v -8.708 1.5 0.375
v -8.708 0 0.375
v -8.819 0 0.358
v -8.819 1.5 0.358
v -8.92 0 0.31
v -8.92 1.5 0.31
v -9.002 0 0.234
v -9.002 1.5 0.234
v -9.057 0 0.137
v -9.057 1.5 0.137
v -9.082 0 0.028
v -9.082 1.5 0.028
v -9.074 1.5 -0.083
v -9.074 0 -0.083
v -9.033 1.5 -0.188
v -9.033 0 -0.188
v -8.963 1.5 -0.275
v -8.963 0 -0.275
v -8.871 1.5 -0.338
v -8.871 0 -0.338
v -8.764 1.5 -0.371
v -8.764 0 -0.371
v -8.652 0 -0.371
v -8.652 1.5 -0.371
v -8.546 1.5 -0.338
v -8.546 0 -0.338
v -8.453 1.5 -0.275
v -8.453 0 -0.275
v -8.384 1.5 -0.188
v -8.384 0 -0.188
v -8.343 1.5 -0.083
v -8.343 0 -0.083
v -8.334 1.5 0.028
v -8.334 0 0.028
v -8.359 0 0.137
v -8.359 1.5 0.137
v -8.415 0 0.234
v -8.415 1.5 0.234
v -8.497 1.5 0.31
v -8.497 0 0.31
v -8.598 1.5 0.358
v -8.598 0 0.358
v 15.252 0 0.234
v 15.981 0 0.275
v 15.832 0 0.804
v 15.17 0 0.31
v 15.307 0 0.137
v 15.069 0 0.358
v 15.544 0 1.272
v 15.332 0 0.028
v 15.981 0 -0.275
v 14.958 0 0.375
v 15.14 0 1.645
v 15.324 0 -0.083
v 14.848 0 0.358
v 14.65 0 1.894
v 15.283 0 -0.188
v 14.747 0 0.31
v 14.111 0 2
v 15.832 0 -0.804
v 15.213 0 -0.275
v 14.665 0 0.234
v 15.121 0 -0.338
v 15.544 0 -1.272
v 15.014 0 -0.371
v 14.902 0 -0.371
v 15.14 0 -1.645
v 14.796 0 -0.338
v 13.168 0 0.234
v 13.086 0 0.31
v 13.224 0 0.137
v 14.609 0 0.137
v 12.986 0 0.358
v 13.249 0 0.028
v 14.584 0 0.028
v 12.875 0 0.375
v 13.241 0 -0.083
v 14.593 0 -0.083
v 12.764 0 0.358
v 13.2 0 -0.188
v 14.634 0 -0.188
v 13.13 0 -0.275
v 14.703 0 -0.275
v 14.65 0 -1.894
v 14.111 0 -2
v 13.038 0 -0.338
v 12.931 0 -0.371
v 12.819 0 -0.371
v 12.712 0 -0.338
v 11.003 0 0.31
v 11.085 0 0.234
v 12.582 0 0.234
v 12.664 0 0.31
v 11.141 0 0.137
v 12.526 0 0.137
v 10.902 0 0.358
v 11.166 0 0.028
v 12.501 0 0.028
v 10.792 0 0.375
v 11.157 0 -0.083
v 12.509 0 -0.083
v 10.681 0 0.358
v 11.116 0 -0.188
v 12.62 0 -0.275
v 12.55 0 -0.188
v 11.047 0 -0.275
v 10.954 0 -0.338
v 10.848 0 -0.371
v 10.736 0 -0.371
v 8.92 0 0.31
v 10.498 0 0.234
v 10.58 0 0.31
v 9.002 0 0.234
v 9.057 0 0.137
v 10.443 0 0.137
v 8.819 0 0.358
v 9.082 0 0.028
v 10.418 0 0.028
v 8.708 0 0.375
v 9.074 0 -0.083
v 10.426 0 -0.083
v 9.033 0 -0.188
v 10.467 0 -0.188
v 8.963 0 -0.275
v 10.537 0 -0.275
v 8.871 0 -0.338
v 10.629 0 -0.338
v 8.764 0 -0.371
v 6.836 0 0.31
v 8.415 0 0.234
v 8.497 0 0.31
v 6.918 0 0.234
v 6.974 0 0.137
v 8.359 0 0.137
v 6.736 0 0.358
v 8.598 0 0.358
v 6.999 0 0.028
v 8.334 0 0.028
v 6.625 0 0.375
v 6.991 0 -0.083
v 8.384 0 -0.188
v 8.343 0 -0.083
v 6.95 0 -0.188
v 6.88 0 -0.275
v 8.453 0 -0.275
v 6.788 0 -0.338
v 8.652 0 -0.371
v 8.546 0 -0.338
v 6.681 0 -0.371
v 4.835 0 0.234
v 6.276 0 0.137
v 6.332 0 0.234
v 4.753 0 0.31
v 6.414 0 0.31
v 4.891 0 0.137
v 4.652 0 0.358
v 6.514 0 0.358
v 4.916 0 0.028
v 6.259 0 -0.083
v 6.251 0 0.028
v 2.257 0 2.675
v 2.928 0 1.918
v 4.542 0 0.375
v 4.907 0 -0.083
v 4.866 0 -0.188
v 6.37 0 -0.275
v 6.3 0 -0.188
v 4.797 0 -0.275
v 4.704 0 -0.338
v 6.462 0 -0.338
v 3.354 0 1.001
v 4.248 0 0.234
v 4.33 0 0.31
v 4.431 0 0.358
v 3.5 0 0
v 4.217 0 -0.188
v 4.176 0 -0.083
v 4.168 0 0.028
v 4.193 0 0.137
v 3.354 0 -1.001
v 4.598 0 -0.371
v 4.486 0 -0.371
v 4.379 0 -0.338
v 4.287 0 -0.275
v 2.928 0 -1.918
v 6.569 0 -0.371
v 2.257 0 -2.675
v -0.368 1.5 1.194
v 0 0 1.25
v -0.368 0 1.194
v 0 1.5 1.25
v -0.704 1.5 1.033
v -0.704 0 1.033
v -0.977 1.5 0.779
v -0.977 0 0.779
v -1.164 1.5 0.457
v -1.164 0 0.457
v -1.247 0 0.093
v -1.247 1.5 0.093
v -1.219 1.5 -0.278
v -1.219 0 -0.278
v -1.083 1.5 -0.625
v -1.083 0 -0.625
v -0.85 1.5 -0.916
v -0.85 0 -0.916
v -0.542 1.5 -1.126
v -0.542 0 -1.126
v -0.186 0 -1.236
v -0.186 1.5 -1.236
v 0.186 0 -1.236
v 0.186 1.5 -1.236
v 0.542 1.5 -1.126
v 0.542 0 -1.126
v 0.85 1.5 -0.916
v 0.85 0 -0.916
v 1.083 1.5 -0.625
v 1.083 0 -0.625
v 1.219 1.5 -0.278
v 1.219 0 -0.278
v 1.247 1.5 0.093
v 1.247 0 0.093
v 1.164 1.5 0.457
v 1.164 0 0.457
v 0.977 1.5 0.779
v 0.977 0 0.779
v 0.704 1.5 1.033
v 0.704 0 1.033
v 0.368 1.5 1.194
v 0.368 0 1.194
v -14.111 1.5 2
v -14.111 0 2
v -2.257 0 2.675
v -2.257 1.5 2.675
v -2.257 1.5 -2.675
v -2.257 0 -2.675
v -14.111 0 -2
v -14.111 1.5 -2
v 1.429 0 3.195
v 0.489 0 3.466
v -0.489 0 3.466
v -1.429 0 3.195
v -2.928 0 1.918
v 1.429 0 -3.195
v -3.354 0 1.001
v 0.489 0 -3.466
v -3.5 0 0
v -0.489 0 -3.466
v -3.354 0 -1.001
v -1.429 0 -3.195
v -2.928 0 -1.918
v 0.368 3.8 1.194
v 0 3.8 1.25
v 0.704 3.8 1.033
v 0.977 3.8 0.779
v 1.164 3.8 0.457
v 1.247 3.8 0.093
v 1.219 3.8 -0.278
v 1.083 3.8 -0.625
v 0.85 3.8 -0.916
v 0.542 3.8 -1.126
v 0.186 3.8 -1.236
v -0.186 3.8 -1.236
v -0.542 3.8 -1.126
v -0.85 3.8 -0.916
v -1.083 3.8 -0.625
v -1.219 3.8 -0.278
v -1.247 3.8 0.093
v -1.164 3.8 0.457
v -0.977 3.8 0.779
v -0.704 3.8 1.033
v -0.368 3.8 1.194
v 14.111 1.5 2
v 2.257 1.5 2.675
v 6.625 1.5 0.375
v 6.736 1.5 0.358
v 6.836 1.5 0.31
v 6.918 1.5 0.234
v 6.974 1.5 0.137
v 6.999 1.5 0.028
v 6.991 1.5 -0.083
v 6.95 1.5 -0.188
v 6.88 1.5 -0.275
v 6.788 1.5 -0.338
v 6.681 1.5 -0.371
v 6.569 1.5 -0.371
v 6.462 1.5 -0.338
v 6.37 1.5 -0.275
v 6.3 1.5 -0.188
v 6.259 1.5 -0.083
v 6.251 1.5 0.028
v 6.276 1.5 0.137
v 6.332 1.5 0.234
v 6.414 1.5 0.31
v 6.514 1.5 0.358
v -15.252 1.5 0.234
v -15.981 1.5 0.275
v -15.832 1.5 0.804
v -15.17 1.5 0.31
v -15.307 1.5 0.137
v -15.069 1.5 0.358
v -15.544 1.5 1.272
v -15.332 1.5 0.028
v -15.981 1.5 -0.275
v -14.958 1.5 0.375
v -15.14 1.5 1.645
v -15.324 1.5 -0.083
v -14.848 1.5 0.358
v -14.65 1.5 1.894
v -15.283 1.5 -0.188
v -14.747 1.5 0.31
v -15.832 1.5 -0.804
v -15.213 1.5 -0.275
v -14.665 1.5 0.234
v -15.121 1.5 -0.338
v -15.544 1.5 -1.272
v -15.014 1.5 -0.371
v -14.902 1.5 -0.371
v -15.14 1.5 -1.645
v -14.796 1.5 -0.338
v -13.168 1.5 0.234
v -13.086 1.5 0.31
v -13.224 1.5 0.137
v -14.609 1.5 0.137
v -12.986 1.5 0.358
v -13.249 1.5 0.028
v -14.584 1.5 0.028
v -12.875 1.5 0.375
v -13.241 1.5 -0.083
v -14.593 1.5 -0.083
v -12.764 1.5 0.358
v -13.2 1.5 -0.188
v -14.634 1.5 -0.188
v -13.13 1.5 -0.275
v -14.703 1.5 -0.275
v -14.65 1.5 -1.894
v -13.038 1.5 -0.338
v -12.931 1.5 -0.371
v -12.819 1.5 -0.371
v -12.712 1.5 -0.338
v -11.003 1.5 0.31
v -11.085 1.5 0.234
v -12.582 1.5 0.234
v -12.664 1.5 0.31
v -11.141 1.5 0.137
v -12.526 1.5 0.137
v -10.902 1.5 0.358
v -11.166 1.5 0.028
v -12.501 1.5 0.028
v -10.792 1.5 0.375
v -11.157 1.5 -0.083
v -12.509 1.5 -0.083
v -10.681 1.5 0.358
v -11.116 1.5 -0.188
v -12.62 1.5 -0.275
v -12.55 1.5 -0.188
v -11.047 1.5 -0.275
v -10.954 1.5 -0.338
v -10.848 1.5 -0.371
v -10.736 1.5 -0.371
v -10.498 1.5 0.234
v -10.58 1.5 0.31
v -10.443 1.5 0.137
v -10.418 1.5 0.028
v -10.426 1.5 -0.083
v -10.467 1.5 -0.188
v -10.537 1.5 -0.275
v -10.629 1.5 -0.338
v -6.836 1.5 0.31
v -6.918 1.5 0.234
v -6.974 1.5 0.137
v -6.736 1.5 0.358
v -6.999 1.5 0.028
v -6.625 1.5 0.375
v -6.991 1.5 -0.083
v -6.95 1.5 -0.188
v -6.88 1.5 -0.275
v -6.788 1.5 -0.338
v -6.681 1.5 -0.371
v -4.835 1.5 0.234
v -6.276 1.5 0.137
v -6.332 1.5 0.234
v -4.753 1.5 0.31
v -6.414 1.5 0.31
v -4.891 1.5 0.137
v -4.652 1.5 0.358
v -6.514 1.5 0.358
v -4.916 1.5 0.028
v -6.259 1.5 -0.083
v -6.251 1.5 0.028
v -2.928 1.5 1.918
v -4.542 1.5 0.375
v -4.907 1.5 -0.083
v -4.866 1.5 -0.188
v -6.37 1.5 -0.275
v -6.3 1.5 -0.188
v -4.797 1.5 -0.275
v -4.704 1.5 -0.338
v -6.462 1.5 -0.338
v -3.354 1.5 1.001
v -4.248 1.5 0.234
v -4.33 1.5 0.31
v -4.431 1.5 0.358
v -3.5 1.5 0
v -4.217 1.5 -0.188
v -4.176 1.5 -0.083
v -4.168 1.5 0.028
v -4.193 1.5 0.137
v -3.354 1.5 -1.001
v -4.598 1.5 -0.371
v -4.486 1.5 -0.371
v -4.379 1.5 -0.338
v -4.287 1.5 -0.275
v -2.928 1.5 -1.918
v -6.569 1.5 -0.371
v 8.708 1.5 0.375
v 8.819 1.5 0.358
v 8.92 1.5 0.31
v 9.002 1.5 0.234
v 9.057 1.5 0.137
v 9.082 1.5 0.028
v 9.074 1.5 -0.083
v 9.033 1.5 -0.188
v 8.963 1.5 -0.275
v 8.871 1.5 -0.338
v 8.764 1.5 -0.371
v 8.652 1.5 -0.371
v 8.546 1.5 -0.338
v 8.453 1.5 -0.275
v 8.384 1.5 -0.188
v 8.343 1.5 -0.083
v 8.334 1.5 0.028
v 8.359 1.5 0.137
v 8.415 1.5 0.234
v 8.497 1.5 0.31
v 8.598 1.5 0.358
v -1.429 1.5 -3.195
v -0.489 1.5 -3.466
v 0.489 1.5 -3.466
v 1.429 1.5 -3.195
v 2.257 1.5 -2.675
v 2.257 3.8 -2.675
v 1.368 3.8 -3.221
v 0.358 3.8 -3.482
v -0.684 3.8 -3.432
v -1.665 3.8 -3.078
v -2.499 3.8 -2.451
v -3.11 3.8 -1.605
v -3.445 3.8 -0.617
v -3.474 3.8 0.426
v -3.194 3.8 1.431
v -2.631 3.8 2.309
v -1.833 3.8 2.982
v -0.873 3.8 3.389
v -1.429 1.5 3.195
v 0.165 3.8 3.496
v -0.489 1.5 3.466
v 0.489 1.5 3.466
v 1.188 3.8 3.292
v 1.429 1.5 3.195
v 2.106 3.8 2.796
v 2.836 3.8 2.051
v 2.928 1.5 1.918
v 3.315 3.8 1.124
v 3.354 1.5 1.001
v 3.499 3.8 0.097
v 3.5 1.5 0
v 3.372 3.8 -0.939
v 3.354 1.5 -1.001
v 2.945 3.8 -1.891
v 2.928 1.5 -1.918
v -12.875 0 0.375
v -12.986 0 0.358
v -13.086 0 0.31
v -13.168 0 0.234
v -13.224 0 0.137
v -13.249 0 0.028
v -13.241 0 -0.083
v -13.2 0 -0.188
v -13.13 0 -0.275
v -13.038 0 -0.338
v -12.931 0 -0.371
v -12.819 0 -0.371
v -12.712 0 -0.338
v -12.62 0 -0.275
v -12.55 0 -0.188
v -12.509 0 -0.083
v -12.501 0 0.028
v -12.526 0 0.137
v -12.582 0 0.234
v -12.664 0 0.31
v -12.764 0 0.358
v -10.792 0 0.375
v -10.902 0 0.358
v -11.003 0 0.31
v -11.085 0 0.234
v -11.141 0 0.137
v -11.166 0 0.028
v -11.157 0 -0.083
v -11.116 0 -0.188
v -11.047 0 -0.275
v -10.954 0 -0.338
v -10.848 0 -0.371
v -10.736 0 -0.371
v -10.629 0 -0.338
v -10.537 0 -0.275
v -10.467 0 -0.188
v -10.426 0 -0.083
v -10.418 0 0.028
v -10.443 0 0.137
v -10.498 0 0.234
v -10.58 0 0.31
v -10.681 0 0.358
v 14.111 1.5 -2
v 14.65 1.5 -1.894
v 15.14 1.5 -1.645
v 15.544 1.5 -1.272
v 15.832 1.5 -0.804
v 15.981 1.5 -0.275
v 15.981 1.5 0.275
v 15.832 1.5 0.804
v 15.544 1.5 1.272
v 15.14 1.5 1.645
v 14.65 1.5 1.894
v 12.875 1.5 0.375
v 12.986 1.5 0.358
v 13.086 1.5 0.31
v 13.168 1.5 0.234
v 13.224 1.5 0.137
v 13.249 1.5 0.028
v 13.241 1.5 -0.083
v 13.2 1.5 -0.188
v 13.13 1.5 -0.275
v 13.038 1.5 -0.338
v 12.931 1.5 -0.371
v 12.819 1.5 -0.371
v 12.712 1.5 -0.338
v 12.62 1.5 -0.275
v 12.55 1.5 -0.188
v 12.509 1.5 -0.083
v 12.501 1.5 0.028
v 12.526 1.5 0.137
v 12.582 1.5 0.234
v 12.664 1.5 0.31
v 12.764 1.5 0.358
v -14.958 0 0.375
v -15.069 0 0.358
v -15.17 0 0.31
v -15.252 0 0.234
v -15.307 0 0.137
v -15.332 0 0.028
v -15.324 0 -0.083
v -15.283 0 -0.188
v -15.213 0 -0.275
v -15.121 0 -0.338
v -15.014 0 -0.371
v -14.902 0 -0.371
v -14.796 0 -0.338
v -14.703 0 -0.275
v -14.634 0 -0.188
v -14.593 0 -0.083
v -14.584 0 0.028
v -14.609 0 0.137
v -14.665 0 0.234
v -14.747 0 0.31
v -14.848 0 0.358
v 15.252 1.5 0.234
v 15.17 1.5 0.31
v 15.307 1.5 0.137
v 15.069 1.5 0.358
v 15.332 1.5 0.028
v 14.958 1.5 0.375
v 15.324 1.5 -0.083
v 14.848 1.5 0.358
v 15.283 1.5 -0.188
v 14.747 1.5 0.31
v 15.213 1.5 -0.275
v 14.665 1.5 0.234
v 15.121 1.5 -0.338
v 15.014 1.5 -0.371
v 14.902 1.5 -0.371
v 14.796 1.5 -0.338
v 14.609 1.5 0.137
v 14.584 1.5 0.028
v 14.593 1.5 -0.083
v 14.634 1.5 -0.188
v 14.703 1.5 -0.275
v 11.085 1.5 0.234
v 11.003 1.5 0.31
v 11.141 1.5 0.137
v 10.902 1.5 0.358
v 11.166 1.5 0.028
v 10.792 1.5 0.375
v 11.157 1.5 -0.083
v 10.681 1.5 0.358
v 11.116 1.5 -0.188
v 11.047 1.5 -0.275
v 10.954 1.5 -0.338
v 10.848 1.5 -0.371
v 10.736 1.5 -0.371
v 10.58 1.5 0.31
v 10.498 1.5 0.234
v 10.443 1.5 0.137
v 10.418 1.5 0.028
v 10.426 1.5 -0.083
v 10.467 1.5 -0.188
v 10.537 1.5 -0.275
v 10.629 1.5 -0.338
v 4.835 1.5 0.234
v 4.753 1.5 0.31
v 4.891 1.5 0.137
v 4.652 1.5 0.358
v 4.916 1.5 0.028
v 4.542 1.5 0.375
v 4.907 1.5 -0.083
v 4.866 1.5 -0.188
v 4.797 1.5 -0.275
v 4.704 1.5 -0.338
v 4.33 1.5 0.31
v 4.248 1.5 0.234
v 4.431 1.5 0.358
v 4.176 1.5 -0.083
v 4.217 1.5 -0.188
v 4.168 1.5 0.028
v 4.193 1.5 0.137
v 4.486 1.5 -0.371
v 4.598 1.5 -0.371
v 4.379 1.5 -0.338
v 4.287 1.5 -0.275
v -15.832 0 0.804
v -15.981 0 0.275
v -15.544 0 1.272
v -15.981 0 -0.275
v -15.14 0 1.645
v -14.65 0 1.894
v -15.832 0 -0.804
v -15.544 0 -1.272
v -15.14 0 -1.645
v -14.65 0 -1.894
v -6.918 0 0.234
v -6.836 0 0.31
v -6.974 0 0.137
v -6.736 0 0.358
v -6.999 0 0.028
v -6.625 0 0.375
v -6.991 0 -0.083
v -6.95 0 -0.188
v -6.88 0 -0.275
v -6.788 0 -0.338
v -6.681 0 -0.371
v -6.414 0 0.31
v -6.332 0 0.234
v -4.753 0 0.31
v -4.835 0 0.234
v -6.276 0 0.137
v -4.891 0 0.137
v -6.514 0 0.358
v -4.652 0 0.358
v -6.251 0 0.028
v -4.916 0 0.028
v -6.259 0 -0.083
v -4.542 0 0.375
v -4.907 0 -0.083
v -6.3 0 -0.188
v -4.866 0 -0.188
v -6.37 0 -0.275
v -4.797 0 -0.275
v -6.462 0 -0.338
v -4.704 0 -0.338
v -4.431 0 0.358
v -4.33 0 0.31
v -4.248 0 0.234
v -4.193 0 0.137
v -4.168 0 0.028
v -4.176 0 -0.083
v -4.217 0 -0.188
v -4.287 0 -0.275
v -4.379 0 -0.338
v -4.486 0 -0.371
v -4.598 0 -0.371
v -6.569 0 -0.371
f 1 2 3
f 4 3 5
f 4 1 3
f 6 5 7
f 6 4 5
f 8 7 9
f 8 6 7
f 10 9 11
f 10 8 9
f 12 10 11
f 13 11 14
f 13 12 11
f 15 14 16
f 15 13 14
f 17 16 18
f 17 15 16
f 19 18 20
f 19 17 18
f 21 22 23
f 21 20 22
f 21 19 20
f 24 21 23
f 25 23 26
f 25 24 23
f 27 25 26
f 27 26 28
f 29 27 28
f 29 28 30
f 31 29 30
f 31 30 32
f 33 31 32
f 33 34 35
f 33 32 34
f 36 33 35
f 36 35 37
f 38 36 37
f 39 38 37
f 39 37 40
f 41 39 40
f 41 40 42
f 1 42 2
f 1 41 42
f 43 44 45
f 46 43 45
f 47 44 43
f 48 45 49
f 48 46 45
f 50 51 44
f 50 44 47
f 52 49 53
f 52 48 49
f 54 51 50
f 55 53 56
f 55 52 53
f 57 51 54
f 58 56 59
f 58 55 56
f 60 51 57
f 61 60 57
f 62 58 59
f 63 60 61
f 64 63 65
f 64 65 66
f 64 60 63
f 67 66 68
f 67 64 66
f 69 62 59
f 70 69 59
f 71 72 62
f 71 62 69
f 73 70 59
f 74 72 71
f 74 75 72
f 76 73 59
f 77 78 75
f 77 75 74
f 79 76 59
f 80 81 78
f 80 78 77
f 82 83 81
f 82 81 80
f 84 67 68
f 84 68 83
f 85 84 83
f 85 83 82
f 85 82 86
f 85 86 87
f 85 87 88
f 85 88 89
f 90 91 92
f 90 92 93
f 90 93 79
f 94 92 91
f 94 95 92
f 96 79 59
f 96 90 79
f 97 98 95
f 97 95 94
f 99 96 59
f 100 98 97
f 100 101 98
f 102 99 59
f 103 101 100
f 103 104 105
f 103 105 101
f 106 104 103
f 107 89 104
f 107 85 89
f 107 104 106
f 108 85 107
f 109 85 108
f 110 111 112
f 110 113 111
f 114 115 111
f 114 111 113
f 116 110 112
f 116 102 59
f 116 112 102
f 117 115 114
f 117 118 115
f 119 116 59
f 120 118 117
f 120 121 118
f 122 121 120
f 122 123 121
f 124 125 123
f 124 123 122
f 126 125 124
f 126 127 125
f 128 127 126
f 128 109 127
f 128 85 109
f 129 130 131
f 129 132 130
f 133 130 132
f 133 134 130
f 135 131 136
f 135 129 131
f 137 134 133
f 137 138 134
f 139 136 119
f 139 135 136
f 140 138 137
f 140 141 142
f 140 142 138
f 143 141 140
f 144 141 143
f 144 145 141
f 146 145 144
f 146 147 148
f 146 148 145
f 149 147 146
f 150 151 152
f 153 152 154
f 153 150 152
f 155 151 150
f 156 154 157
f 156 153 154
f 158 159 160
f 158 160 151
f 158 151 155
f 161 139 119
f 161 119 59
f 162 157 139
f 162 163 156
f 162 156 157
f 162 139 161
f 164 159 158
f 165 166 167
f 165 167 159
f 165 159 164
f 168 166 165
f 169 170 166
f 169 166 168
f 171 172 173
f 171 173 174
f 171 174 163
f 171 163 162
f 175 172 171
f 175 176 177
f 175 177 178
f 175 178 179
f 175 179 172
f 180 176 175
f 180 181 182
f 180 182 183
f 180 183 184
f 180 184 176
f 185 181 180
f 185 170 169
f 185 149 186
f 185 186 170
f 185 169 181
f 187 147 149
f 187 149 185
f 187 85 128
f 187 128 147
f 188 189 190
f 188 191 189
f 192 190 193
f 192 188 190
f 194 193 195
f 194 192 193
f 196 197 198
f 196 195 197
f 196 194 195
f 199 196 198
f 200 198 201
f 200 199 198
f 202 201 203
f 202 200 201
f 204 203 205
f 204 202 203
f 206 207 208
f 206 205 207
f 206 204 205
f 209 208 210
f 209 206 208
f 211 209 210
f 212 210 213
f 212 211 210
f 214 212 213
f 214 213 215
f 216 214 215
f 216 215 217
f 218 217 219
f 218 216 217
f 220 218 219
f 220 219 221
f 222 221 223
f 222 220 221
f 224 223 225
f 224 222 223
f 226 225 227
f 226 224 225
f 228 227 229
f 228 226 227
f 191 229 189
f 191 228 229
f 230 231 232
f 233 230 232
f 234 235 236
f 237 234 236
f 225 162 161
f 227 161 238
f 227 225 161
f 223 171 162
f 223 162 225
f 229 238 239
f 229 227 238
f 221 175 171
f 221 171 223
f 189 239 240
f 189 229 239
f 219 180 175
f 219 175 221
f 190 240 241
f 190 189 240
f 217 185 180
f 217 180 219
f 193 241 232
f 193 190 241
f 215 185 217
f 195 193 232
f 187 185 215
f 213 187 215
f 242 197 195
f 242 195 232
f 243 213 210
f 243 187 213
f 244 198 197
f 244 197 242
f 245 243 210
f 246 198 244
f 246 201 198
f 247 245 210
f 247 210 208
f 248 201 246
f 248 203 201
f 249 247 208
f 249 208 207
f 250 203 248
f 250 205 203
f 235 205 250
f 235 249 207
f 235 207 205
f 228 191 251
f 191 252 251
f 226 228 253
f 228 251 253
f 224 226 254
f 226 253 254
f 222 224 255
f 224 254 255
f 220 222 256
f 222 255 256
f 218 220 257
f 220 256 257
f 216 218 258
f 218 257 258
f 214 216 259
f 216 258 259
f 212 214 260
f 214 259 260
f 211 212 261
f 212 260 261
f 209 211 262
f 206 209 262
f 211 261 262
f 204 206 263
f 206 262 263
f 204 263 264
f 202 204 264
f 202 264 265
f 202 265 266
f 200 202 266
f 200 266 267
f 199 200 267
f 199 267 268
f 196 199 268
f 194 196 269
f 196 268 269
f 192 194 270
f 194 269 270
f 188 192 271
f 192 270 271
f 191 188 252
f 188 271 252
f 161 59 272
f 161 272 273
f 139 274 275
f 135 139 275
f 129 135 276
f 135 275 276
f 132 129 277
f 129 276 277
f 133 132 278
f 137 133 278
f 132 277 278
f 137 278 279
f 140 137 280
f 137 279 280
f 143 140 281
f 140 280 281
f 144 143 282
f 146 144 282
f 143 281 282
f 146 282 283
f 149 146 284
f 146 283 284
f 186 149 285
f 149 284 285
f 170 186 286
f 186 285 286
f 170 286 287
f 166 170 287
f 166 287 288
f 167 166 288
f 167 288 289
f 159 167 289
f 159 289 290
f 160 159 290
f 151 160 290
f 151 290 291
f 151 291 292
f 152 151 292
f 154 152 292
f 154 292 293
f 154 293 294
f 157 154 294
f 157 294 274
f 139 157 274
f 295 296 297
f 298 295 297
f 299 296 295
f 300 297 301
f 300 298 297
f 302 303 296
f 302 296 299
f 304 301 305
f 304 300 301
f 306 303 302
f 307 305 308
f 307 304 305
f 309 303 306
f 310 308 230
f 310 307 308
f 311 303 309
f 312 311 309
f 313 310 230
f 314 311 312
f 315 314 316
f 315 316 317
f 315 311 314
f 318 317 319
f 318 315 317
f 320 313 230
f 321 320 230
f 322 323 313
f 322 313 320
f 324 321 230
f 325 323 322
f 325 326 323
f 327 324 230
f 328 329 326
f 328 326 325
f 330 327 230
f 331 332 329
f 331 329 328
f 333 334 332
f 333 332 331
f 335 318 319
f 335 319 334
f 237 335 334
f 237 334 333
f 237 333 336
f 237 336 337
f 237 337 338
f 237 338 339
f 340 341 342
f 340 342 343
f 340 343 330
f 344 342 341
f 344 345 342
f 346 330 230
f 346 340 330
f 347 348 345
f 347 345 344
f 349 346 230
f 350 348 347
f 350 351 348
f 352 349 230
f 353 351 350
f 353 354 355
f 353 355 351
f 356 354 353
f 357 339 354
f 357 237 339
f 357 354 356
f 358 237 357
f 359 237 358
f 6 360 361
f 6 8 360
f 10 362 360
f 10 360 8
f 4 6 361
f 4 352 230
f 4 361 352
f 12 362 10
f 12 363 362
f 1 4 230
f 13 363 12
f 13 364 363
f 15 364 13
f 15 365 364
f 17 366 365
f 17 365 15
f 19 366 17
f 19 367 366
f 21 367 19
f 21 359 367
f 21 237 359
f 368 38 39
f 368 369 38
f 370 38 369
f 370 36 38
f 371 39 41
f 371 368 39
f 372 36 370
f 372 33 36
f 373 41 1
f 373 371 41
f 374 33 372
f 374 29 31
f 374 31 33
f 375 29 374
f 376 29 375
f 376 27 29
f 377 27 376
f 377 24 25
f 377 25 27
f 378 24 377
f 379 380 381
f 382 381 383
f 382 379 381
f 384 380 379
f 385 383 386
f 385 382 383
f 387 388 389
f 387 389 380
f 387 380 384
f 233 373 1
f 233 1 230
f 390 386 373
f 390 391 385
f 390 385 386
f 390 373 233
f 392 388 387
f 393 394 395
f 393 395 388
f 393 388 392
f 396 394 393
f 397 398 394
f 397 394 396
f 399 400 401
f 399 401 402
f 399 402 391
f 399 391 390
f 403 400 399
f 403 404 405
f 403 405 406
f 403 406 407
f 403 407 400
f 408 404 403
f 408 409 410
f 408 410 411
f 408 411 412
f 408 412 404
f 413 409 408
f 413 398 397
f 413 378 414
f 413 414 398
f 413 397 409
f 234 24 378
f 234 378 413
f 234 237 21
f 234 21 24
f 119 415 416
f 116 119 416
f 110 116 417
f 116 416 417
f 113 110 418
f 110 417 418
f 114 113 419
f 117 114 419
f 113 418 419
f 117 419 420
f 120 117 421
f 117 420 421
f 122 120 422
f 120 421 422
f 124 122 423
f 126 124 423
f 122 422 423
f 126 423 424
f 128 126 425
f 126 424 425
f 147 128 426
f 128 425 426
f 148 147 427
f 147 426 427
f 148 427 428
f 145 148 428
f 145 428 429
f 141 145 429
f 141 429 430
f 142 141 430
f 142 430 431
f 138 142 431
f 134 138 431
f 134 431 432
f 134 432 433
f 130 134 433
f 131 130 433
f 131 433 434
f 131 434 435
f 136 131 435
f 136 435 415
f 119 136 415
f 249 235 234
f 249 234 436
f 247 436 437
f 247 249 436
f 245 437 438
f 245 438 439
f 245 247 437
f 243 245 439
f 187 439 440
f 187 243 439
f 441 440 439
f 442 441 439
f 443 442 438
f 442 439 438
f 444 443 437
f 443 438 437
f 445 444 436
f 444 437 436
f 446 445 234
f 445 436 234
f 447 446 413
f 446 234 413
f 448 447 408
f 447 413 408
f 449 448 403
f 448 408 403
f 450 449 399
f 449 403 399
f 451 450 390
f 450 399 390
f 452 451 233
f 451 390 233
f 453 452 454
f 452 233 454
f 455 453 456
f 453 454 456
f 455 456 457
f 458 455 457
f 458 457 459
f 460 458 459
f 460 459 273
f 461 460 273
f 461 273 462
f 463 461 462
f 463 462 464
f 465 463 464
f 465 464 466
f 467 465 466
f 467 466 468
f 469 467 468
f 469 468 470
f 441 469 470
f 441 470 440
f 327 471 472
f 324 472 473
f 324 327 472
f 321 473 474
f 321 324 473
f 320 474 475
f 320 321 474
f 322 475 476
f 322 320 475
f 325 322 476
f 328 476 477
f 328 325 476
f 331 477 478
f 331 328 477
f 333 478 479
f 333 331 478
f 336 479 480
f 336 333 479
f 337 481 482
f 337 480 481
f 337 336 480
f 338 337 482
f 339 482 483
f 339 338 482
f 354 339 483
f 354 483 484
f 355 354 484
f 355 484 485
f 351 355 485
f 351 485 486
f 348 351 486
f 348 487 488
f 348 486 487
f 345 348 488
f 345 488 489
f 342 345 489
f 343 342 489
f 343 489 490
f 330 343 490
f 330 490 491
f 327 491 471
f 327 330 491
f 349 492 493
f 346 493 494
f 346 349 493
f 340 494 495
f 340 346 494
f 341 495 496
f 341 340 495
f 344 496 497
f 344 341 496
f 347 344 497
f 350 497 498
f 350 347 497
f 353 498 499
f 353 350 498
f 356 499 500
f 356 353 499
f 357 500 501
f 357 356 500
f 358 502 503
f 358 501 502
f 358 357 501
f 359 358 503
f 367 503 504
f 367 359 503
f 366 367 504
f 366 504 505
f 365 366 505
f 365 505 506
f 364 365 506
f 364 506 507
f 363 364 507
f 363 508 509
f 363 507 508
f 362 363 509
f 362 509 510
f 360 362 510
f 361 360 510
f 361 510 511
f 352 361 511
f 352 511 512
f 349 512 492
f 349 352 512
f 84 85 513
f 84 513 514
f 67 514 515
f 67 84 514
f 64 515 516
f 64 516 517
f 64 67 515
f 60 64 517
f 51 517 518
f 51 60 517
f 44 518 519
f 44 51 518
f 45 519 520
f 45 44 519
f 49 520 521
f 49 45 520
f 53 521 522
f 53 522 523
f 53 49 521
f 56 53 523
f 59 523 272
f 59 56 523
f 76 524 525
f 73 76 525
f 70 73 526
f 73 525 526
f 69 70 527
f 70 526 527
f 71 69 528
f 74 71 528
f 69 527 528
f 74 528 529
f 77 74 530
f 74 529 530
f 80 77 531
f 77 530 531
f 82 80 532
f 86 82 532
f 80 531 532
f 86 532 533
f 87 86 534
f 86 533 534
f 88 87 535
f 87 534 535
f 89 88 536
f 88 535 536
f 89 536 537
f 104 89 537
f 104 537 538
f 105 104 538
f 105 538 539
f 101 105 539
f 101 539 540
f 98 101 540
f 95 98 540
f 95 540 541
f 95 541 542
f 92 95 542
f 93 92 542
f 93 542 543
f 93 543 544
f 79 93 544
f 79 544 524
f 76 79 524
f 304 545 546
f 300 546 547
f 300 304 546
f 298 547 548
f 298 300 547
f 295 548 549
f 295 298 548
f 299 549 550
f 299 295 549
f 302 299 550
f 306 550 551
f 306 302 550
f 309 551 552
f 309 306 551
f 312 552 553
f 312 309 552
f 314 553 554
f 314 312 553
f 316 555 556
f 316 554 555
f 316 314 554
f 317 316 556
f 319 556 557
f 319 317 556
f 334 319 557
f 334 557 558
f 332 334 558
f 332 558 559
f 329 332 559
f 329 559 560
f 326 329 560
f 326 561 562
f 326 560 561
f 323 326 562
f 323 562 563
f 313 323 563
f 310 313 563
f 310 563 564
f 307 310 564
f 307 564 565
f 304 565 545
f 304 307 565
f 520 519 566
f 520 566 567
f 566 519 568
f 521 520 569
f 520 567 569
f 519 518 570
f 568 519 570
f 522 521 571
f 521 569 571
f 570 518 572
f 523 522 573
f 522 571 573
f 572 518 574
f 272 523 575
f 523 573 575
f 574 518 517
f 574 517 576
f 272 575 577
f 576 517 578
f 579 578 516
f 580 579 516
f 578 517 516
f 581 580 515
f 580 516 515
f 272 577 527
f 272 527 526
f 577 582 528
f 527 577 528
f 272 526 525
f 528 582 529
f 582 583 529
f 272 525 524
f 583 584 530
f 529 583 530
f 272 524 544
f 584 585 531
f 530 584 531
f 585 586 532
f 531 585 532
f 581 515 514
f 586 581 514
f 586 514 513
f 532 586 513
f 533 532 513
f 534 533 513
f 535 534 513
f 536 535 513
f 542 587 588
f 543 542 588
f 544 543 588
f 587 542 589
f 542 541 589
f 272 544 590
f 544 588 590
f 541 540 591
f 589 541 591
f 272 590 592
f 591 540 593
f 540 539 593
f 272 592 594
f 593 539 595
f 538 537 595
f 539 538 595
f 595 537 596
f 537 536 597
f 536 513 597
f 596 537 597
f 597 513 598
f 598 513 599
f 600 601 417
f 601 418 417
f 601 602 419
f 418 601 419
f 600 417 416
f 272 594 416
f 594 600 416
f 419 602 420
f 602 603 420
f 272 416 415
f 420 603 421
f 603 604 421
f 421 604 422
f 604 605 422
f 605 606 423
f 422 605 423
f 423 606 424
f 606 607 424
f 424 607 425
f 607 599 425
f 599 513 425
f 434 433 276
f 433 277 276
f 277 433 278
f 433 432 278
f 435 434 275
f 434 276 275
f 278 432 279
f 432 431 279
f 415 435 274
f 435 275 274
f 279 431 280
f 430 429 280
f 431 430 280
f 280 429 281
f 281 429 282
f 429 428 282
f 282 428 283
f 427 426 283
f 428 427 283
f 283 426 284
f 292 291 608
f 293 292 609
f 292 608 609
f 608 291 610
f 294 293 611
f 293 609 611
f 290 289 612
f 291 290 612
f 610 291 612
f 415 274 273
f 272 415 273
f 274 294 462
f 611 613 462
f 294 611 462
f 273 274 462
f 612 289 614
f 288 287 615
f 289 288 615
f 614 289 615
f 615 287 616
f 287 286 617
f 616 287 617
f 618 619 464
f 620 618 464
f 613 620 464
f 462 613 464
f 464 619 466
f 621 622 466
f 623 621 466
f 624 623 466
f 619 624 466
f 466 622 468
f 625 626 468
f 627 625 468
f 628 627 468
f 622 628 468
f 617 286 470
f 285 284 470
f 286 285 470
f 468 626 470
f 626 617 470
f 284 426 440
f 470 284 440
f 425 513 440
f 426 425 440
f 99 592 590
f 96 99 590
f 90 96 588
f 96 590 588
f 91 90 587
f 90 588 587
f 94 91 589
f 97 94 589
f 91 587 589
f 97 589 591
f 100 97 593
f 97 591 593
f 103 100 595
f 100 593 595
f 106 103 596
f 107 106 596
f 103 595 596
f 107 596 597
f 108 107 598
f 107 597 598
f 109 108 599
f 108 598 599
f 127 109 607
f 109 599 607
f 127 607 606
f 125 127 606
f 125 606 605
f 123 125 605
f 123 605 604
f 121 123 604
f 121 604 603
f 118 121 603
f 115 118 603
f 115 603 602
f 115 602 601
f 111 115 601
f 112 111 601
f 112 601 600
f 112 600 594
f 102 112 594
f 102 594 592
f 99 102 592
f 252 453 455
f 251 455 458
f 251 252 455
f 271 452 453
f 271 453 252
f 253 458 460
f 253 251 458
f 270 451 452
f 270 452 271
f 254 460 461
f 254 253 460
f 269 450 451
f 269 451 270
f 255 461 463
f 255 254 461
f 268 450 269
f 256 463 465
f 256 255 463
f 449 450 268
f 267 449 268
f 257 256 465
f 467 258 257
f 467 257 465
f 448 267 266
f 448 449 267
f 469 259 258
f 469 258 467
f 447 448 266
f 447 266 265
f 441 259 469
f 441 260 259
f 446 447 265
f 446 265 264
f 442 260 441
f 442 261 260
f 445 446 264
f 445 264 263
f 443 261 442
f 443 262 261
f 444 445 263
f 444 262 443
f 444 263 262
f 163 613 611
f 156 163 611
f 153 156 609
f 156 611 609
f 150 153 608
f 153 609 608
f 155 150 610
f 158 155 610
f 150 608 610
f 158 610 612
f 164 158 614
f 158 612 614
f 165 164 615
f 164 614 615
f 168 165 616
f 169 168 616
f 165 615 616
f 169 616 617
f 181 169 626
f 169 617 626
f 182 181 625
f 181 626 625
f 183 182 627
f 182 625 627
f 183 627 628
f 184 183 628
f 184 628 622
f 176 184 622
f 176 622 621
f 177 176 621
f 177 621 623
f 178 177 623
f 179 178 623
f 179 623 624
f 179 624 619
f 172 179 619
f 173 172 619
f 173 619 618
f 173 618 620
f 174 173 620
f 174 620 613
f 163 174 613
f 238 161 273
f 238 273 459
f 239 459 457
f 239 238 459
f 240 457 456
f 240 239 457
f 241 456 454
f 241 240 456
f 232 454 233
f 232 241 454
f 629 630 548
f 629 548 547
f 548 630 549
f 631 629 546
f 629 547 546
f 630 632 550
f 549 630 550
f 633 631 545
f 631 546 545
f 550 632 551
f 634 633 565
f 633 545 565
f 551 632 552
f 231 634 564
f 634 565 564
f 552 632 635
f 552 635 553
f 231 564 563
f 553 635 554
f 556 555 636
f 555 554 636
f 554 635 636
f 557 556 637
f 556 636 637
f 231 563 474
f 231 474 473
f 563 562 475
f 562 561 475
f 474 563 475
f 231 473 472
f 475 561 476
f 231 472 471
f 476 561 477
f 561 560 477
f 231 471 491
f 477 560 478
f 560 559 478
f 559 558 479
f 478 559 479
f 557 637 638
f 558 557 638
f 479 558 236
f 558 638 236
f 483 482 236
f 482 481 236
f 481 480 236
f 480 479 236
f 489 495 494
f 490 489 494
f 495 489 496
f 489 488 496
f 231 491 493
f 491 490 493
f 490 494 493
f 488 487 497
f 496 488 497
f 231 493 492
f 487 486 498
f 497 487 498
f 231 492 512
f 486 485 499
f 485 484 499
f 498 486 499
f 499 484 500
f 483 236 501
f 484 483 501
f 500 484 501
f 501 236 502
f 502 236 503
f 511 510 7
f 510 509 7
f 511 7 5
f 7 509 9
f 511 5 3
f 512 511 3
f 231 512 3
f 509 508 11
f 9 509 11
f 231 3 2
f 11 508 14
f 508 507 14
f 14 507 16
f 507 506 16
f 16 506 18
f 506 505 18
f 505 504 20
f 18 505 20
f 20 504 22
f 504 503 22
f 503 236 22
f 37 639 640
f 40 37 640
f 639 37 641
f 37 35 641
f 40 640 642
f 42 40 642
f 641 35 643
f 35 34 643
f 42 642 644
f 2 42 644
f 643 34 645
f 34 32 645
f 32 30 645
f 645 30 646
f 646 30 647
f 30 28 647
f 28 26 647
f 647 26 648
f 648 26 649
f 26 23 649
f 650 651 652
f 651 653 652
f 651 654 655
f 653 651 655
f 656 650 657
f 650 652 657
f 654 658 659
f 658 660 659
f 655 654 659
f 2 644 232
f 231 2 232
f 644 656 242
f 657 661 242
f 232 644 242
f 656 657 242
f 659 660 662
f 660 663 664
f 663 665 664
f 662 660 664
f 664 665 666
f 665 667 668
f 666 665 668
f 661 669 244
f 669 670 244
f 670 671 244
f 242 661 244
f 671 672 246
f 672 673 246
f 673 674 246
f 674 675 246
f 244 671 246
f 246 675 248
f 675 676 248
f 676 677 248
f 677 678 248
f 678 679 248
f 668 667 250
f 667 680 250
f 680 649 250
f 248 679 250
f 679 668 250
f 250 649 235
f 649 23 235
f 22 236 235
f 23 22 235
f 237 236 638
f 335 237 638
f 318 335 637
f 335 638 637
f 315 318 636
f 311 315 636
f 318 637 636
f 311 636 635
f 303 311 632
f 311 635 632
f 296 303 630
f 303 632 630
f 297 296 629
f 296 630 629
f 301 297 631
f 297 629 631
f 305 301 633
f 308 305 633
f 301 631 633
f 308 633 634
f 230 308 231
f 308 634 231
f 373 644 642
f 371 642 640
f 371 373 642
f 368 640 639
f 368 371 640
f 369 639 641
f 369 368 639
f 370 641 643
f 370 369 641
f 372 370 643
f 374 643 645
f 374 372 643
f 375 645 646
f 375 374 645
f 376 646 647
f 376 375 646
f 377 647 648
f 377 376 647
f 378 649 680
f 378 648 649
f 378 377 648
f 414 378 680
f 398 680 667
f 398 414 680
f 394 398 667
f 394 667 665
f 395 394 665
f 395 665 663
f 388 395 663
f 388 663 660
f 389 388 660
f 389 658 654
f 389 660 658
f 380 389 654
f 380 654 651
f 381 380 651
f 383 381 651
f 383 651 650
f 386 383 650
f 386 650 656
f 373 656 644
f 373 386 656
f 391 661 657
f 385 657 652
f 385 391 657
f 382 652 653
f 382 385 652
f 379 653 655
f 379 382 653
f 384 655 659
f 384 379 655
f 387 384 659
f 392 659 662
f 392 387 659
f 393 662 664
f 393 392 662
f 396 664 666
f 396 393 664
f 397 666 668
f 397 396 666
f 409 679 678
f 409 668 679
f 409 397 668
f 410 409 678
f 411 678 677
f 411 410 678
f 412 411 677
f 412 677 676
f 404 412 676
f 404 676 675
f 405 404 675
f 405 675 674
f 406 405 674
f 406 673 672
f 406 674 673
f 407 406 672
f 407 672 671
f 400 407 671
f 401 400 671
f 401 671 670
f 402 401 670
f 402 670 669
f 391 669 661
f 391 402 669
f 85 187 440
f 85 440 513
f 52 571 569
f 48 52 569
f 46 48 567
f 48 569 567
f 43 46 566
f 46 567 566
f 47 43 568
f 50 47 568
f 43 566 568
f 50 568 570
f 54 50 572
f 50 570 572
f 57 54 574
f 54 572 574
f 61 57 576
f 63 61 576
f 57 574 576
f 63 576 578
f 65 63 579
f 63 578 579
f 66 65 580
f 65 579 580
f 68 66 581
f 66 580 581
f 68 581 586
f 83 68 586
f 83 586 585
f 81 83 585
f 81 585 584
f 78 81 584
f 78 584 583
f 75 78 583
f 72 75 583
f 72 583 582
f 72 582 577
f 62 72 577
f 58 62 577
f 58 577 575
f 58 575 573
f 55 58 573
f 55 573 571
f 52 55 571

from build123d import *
from build123d.topology import SkipClean

# Parameters (mm, degrees)
BOSS_EXTRUDE1_DEPTH = 1.5
SKETCH2_R           = 3.5
BOSS_EXTRUDE2_DEPTH = 2.3
SKETCH3_R           = 0.375
SKETCH3_R_2         = 1.25
CUT_EXTRUDE1_DEPTH  = 17.539044712


with BuildPart() as part:
    # Sketch1 → Boss-Extrude1 (new body)
    with BuildSketch(Plane(origin=(0, 0, 0), x_dir=(1, 0, 0), z_dir=(0, 1, 0))):
        with BuildLine():
            Line((2.257072219, 2.675), (14.110649579, 2))
            ThreePointArc((14.110649579, 2), (16, 0), (14.110649579, -2))
            Line((14.110649579, -2), (2.257072219, -2.675))
            ThreePointArc((2.257072219, -2.675), (-3.5, 0), (2.257072219, 2.675))
        make_face()
    boss_extrude1 = extrude(amount=BOSS_EXTRUDE1_DEPTH)

    # Sketch2 → Boss-Extrude2 (add)
    with SkipClean():  # the faces are left unmerged after this step: merging them gives an invalid solid
        with BuildSketch(Plane(origin=(0, 1.5, 0), x_dir=(1, 0, 0), z_dir=(0, 1, 0))):
            with Locations(Location((0, 0, 0), (0, 0, 49.843487791))):
                Circle(SKETCH2_R)
        extrude(amount=BOSS_EXTRUDE2_DEPTH)

    # Sketch3 → Cut-Extrude1 (cut, symmetric)
    with SkipClean():  # the faces are left unmerged after this step: merging them gives an invalid solid
        with BuildSketch(Plane(origin=(0, 1.5, 0), x_dir=(1, 0, 0), z_dir=(0, 1, 0))):
            with Locations(Location((14.958333333, 0, 0), (0, 0, 270))):
                Circle(SKETCH3_R)
            with Locations(Location((12.875, 0, 0), (0, 0, 270))):
                Circle(SKETCH3_R)
            with Locations(Location((10.791666667, 0, 0), (0, 0, 270))):
                Circle(SKETCH3_R)
            with Locations(Location((8.708333333, 0, 0), (0, 0, 270))):
                Circle(SKETCH3_R)
            with Locations(Location((6.625, 0, 0), (0, 0, 270))):
                Circle(SKETCH3_R)
            with Locations(Location((4.541666667, 0, 0), (0, 0, 270))):
                Circle(SKETCH3_R)
            with Locations(Location((0, 0, 0), (0, 0, 270))):
                Circle(SKETCH3_R_2)
        cut_extrude1 = extrude(amount=CUT_EXTRUDE1_DEPTH, both=True, mode=Mode.SUBTRACT)

    # Mirror1: Boss-Extrude1, Cut-Extrude1 across plane
    with SkipClean():  # the faces are left unmerged after this step: merging them gives an invalid solid
        add(boss_extrude1.mirror(Plane(origin=(0, 0, 0), x_dir=(0, 0, 1), z_dir=(1, 0, 0))))
        add(cut_extrude1.mirror(Plane(origin=(0, 0, 0), x_dir=(0, 0, 1), z_dir=(1, 0, 0))), mode=Mode.SUBTRACT)


solid = part.part
